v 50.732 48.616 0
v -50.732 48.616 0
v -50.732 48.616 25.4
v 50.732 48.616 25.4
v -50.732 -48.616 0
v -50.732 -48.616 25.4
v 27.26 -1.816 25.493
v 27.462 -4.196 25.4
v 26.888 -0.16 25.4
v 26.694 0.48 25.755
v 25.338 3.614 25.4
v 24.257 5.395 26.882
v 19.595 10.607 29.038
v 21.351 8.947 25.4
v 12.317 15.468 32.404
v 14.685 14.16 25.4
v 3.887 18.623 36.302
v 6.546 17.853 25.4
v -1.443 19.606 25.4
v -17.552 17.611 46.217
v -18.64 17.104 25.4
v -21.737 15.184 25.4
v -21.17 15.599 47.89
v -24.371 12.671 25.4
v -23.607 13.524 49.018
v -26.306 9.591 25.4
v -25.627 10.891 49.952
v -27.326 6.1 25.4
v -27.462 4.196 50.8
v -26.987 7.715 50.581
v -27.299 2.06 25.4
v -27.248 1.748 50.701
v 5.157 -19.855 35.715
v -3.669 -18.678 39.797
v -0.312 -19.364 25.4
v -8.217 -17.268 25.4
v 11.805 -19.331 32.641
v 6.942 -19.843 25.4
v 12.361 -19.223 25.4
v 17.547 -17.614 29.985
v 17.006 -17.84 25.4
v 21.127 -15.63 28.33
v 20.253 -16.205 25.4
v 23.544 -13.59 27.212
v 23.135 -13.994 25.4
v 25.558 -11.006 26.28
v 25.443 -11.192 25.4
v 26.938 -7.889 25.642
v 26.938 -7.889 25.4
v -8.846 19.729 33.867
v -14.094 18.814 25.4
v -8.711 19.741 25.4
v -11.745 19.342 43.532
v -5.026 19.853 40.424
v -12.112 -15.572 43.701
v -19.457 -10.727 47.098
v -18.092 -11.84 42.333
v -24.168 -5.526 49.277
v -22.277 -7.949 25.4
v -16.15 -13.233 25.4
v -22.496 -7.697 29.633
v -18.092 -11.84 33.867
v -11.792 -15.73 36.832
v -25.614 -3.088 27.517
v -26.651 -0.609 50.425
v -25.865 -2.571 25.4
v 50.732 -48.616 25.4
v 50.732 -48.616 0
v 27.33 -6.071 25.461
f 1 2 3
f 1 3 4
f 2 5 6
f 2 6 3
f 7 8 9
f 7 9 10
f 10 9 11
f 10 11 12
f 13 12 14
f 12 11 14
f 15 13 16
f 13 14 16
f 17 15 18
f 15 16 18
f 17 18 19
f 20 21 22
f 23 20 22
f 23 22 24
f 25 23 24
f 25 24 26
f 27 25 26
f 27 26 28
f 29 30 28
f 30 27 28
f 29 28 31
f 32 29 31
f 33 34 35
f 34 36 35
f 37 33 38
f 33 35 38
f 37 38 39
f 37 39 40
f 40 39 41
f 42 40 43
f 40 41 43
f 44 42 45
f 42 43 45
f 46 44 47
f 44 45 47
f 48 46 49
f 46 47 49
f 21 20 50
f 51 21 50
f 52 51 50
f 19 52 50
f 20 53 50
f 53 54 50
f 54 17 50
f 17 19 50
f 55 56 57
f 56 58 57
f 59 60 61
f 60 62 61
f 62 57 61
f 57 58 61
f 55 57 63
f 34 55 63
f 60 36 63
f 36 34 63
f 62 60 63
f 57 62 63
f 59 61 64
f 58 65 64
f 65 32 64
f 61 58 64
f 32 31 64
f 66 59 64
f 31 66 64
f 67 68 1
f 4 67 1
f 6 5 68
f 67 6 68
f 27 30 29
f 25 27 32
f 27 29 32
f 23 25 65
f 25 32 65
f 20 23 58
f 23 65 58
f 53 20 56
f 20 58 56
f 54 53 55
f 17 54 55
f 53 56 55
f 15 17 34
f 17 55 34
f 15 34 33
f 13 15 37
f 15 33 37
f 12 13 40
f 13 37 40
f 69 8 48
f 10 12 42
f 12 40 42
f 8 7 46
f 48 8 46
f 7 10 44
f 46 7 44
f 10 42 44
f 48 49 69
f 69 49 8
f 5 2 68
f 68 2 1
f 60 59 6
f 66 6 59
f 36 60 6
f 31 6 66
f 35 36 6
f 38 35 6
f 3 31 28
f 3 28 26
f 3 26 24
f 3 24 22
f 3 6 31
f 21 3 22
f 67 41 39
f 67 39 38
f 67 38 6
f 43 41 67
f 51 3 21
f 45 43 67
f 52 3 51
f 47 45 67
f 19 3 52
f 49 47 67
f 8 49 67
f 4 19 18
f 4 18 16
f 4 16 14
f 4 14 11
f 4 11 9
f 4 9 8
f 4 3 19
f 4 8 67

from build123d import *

# Parameters (mm, degrees)
F0_W     = 101.4645919204
F0_H     = 97.2314924002
F1_DEPTH = 25.4
F3_DEPTH = 50.8
F5_DEPTH = 97.2324925002


with BuildPart() as f1:
    # F0 (on Top) → F1 (new body)
    with BuildSketch(Plane.XY):
        Rectangle(F0_W, F0_H)
    extrude(amount=F1_DEPTH)

    # F2 (on Top) → F3 (join)
    with BuildSketch(Plane.XY):
        with BuildLine():
            add(Edge.make_bspline(
                [(26.9378982484, -7.8889131546), (36.1832899021, 23.6808880022), (-8.8462532974, 19.7293571557), (-53.8757964969, 15.7778263092), (-18.0916449511, -11.8404440011), (17.6925065947, -39.4587143115), (26.9378982484, -7.8889131546)],
                knots=[0, 0, 0, 2.0943951024, 2.0943951024, 4.1887902048, 4.1887902048, 6.2831853072, 6.2831853072, 6.2831853072], degree=2, weights=[1, 0.5, 1, 0.5, 1, 0.5, 1]))
        make_face()
    extrude(amount=F3_DEPTH)

    # F4 (on face) → F5 (cut, through all)
    with BuildSketch(Plane.XZ.offset(48.6157462001)):
        Polygon((27.4616602615, 50.8), (-27.4616602615, 50.8), (27.4616602615, 25.4), align=None)
    extrude(amount=-F5_DEPTH, mode=Mode.SUBTRACT)


solid = f1.part
